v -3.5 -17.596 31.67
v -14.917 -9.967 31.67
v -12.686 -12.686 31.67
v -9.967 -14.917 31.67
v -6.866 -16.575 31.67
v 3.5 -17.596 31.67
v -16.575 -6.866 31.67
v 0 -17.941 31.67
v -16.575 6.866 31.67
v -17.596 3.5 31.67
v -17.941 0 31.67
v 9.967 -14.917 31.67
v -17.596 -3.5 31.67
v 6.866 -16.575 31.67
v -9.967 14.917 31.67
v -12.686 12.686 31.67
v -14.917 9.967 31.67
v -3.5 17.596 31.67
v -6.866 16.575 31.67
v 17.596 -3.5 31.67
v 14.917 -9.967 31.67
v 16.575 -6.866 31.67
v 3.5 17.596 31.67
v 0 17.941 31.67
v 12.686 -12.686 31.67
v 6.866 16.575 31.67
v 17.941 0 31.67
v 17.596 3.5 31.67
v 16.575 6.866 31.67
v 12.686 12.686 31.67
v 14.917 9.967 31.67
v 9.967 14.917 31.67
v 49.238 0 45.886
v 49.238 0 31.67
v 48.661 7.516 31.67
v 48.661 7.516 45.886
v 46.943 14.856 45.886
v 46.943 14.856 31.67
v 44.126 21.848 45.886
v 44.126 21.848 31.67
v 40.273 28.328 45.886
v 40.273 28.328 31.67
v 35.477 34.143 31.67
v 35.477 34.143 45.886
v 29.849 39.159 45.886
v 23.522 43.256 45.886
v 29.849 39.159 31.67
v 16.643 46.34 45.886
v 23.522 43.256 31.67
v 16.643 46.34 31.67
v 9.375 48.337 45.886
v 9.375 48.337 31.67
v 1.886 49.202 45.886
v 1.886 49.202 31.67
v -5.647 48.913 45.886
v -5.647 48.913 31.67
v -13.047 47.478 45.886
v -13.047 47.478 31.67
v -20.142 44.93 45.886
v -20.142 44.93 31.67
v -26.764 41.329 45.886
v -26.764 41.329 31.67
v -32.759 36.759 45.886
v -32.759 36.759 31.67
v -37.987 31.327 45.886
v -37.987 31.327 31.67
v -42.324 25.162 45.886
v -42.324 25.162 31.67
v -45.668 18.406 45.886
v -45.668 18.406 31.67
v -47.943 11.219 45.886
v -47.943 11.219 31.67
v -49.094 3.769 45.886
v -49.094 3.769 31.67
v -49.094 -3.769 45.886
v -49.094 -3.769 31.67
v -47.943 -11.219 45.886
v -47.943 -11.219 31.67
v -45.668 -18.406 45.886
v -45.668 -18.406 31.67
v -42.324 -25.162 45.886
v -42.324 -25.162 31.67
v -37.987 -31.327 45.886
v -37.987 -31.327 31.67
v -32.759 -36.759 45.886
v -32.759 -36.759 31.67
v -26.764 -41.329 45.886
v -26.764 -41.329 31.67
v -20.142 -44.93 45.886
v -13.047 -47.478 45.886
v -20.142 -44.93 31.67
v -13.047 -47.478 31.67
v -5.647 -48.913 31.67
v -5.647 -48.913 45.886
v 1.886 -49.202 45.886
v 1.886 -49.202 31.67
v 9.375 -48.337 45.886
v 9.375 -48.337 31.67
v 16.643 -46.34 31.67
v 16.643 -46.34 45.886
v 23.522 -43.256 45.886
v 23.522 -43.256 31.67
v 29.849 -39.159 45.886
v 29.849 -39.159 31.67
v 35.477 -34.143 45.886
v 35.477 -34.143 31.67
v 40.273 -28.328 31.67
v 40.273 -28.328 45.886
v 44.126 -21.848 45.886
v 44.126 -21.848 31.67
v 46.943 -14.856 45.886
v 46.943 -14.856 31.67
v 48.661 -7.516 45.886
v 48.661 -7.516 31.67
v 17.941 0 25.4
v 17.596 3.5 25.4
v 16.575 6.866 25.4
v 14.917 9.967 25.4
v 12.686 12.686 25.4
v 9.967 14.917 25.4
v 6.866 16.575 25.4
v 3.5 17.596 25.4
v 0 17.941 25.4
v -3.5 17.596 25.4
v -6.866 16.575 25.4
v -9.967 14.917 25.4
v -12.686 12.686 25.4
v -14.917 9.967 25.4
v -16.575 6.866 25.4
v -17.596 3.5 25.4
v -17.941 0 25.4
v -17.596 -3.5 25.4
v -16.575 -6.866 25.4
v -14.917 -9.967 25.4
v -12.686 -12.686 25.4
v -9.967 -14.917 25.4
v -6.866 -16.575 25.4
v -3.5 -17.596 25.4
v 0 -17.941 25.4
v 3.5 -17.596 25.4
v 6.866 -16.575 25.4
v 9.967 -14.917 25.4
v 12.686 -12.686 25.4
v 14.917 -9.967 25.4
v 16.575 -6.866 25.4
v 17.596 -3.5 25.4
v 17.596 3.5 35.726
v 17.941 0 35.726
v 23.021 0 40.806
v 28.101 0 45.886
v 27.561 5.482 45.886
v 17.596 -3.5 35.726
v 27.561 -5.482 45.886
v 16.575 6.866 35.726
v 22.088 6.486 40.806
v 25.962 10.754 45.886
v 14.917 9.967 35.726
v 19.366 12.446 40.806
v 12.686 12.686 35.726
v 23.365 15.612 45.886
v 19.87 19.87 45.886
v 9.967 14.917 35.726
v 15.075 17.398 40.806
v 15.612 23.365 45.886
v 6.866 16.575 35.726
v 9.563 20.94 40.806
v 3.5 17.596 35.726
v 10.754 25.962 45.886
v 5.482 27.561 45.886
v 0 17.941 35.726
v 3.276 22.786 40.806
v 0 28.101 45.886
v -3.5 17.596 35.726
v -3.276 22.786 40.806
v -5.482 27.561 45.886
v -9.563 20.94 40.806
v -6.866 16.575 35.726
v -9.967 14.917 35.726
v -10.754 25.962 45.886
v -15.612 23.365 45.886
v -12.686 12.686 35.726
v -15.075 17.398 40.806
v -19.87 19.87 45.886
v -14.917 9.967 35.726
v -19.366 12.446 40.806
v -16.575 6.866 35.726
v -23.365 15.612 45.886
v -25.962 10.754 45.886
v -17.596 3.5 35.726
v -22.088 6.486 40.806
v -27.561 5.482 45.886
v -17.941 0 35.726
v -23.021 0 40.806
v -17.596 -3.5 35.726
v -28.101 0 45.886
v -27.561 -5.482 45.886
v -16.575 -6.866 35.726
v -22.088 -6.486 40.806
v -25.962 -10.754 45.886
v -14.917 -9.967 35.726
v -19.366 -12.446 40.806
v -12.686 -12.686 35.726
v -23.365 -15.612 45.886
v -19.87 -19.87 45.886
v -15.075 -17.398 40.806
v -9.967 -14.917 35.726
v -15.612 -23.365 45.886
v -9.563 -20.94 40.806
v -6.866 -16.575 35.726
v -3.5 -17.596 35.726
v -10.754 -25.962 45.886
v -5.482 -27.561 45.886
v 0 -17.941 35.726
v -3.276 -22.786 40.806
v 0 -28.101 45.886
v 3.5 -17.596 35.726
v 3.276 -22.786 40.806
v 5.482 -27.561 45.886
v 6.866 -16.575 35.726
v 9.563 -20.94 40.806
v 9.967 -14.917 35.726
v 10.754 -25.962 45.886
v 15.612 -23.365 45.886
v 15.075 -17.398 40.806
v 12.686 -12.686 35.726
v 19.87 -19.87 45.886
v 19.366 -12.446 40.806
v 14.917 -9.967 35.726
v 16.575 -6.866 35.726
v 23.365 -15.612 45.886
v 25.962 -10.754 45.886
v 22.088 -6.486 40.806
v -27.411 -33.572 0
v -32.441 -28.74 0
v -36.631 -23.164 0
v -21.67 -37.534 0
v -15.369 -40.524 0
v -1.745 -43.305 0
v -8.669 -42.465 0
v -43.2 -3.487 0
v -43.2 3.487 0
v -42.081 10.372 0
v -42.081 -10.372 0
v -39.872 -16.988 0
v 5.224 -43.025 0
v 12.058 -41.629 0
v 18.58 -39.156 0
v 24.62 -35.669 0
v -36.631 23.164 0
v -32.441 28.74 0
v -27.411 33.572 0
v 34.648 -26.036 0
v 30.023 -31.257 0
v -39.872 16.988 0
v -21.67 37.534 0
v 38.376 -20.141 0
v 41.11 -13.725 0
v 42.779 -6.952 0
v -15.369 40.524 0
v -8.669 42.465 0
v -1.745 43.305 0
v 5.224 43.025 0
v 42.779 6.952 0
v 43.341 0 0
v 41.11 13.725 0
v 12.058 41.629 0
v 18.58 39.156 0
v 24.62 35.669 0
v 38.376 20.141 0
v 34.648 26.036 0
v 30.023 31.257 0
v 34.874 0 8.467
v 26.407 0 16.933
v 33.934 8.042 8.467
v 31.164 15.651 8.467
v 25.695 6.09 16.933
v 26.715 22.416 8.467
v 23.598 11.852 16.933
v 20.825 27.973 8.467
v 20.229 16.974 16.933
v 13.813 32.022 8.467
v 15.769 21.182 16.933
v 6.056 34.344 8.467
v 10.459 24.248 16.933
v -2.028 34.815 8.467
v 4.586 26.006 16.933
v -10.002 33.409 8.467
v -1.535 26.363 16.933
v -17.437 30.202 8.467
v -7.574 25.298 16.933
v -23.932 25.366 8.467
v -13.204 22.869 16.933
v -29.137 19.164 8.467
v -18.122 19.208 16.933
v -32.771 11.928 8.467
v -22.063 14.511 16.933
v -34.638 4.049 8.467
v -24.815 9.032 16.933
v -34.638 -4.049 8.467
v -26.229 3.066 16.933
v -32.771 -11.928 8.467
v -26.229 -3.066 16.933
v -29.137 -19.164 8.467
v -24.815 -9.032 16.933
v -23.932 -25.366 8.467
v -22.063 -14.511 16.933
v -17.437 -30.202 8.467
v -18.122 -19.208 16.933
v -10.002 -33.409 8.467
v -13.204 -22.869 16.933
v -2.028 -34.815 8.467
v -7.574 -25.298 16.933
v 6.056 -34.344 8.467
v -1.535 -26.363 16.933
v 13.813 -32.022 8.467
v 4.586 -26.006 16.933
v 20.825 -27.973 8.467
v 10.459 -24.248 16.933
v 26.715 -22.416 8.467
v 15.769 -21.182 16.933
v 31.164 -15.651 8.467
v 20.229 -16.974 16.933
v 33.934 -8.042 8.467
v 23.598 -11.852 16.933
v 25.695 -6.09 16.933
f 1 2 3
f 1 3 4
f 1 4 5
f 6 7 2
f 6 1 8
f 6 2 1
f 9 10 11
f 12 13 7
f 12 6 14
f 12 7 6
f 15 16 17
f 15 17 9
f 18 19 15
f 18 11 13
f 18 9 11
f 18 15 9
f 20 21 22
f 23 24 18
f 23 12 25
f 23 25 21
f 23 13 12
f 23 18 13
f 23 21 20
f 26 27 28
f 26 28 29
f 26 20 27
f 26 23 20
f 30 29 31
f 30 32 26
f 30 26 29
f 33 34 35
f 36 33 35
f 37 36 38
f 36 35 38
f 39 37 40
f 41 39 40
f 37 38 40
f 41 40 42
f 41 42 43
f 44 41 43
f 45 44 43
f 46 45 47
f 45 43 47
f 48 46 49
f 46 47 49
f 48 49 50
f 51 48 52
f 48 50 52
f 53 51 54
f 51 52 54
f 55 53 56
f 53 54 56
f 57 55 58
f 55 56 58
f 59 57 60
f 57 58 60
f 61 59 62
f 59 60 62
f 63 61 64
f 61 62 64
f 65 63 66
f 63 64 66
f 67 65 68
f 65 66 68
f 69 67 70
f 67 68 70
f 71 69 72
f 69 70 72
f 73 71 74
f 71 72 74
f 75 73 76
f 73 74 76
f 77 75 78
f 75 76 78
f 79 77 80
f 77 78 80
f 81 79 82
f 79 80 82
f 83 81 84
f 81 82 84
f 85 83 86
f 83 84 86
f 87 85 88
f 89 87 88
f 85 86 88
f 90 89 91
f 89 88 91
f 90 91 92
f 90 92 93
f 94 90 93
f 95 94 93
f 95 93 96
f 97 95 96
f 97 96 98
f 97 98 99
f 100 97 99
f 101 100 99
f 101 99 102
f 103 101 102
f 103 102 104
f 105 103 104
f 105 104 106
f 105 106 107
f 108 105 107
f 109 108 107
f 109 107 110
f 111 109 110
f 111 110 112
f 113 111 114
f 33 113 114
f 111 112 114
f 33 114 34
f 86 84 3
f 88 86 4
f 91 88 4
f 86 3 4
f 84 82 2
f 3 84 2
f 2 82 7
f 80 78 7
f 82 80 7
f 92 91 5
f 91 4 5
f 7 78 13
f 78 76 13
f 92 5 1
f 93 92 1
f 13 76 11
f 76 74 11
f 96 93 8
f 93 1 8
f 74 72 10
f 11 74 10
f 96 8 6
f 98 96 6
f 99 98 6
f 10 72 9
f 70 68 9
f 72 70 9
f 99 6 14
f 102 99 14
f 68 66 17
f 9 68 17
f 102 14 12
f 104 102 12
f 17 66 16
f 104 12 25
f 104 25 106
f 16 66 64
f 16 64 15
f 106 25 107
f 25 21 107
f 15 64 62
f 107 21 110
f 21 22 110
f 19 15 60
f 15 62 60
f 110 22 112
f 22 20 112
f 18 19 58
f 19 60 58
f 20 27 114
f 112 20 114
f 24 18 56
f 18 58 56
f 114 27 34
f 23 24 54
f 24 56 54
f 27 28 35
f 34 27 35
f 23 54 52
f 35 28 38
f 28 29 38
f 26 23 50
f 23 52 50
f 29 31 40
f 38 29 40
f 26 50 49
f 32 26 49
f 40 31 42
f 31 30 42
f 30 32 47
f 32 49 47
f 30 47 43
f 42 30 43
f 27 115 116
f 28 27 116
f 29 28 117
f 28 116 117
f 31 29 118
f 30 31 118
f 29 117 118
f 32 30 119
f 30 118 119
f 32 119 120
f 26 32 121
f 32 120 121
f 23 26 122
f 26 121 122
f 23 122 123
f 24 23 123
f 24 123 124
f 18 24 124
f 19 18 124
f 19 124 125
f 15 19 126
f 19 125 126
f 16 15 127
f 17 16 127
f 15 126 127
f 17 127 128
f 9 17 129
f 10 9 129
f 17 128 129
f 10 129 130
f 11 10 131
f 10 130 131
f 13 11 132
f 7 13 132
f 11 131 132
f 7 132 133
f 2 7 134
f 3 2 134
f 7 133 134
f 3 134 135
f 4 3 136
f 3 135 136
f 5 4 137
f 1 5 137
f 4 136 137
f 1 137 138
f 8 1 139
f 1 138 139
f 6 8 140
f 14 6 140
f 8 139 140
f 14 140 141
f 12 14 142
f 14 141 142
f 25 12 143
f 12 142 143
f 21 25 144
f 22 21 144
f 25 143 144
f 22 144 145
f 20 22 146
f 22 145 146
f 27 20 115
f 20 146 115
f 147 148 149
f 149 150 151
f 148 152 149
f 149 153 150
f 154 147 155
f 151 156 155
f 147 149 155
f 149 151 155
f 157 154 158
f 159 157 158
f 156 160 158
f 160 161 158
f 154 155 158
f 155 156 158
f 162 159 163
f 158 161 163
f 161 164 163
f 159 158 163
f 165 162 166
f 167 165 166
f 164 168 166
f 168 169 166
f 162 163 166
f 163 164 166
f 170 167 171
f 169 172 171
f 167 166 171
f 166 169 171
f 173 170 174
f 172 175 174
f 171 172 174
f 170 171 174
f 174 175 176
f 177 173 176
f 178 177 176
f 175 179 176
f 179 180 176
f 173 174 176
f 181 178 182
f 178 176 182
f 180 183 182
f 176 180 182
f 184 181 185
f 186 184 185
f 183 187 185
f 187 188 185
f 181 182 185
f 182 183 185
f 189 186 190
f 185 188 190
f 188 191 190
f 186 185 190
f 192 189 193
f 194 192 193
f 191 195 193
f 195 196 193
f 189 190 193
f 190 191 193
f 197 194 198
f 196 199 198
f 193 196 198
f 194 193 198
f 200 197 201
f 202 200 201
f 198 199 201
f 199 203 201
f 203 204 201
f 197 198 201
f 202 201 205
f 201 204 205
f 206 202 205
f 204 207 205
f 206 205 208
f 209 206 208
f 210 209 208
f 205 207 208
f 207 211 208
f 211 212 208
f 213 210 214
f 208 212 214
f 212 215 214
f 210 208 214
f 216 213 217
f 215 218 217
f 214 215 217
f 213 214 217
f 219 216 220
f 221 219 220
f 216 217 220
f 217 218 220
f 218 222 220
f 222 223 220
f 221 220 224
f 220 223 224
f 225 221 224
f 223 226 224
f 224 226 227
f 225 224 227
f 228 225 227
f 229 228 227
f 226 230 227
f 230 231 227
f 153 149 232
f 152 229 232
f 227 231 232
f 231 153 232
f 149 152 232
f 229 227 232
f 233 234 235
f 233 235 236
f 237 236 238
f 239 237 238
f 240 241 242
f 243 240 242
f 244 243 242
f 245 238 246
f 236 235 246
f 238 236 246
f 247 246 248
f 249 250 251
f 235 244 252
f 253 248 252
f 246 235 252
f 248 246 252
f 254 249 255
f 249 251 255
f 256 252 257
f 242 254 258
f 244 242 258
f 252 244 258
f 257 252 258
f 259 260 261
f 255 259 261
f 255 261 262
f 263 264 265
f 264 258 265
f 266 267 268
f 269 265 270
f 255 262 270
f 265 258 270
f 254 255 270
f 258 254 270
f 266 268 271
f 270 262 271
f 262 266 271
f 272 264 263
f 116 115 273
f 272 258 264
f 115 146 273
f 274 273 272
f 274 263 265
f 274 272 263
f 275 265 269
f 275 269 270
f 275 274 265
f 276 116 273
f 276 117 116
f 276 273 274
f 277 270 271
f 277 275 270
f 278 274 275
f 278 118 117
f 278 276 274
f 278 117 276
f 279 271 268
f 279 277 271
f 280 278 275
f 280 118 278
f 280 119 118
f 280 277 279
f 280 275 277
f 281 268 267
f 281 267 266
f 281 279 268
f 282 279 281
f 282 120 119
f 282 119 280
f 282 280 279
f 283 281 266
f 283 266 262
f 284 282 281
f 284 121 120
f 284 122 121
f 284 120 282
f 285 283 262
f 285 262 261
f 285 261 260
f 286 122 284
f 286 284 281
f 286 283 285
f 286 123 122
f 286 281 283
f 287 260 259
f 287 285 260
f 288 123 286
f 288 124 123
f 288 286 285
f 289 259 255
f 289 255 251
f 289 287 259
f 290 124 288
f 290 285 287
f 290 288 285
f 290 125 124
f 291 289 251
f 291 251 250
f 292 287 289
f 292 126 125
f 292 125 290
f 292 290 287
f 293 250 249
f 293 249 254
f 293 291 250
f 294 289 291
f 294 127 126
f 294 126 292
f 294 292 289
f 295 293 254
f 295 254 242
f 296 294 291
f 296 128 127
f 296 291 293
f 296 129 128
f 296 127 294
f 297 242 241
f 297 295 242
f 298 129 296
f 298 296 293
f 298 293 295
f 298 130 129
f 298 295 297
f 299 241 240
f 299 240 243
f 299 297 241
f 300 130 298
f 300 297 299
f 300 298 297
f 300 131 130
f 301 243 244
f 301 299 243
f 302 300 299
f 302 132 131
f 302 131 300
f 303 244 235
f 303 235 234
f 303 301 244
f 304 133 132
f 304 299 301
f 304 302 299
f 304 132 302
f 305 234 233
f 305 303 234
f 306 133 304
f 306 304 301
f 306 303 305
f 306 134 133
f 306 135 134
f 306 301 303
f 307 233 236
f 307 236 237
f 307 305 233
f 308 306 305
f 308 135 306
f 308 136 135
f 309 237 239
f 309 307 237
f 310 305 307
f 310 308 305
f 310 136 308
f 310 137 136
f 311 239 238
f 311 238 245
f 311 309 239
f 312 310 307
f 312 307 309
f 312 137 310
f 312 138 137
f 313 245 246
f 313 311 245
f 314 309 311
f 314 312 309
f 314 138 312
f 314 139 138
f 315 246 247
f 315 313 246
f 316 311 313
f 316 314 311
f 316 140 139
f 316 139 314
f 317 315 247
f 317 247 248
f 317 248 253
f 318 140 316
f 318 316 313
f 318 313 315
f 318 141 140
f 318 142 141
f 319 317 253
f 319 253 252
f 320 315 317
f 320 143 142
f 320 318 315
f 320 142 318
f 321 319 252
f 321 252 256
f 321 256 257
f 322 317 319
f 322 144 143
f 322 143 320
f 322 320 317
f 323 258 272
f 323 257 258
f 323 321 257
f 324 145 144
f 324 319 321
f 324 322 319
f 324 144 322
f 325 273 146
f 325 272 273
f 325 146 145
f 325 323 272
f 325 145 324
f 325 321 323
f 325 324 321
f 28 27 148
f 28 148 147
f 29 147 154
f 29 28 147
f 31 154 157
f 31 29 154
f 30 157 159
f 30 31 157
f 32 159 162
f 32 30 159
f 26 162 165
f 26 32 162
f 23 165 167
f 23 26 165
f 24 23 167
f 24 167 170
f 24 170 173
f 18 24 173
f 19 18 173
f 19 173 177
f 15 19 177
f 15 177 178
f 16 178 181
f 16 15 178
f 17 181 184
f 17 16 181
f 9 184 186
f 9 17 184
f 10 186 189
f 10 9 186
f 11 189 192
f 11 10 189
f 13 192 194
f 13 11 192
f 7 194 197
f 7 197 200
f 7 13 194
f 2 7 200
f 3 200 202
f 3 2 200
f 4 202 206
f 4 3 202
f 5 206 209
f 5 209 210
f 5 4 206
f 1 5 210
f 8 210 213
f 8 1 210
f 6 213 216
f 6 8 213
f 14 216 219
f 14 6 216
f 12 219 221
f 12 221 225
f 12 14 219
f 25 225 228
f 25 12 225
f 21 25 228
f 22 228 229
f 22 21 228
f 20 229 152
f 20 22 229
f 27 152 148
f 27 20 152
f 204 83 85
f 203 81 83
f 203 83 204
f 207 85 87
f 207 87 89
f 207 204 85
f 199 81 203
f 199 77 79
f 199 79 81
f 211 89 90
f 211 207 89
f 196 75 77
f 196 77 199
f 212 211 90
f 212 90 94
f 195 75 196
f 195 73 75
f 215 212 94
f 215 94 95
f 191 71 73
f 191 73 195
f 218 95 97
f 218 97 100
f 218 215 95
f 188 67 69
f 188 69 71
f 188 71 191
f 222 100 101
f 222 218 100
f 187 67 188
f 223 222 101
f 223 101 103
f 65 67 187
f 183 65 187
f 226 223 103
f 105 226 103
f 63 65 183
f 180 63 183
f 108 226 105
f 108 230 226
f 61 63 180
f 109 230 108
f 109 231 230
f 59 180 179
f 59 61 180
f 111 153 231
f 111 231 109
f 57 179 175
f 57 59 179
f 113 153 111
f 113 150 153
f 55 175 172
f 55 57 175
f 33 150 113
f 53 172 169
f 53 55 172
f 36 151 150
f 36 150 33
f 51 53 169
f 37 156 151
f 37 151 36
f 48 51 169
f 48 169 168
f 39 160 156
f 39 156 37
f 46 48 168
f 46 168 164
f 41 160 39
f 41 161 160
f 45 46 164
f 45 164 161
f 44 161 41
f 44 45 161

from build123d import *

# Parameters (mm, degrees)
F0_R     = 43.3405251853
F1_DEPTH = 25.4
F2_SIZE  = 25.39999
F3_DEPTH = 6.2703248113
F4_R     = 49.2381441728
F4_R_2   = 17.9405351853
F5_DEPTH = 14.2157543451
F6_SIZE  = 10.16


# Not quite as in the source:
# - a fillet or chamfer is up to 0.001 mm smaller than in the source, because OpenCascade refuses the exact size


with BuildPart() as f1:
    # F0 (on Top) → F1 (new body)
    with BuildSketch(Plane.XY):
        Circle(F0_R)
    extrude(amount=F1_DEPTH)

    # F2 (size 25.4 in the source; OpenCascade refuses exactly that, so slightly less here)
    f2_edges = [f1.edges().sort_by_distance(p)[0] for p in [
        (-43.340525, 0, 25.4),
    ]]
    chamfer(f2_edges, length=F2_SIZE)

    # F3 (add): a face of the model
    f3_faces = [f1.faces().sort_by_distance(p)[0] for p in [
        (0, 0, 25.4),
    ]]
    extrude(f3_faces, amount=F3_DEPTH)


with BuildPart() as f5:
    # F4 (on face) → F5 (new body)
    with BuildSketch(Plane.XY.offset(31.6703248113)):
        Circle(F4_R)
        Circle(F4_R_2, mode=Mode.SUBTRACT)
    extrude(amount=F5_DEPTH)

    # F6
    f6_edges = [f5.edges().sort_by_distance(p)[0] for p in [
        (-17.940535, 0, 45.886079),
    ]]
    chamfer(f6_edges, length=F6_SIZE)


solid = Compound([f1.part, f5.part])
